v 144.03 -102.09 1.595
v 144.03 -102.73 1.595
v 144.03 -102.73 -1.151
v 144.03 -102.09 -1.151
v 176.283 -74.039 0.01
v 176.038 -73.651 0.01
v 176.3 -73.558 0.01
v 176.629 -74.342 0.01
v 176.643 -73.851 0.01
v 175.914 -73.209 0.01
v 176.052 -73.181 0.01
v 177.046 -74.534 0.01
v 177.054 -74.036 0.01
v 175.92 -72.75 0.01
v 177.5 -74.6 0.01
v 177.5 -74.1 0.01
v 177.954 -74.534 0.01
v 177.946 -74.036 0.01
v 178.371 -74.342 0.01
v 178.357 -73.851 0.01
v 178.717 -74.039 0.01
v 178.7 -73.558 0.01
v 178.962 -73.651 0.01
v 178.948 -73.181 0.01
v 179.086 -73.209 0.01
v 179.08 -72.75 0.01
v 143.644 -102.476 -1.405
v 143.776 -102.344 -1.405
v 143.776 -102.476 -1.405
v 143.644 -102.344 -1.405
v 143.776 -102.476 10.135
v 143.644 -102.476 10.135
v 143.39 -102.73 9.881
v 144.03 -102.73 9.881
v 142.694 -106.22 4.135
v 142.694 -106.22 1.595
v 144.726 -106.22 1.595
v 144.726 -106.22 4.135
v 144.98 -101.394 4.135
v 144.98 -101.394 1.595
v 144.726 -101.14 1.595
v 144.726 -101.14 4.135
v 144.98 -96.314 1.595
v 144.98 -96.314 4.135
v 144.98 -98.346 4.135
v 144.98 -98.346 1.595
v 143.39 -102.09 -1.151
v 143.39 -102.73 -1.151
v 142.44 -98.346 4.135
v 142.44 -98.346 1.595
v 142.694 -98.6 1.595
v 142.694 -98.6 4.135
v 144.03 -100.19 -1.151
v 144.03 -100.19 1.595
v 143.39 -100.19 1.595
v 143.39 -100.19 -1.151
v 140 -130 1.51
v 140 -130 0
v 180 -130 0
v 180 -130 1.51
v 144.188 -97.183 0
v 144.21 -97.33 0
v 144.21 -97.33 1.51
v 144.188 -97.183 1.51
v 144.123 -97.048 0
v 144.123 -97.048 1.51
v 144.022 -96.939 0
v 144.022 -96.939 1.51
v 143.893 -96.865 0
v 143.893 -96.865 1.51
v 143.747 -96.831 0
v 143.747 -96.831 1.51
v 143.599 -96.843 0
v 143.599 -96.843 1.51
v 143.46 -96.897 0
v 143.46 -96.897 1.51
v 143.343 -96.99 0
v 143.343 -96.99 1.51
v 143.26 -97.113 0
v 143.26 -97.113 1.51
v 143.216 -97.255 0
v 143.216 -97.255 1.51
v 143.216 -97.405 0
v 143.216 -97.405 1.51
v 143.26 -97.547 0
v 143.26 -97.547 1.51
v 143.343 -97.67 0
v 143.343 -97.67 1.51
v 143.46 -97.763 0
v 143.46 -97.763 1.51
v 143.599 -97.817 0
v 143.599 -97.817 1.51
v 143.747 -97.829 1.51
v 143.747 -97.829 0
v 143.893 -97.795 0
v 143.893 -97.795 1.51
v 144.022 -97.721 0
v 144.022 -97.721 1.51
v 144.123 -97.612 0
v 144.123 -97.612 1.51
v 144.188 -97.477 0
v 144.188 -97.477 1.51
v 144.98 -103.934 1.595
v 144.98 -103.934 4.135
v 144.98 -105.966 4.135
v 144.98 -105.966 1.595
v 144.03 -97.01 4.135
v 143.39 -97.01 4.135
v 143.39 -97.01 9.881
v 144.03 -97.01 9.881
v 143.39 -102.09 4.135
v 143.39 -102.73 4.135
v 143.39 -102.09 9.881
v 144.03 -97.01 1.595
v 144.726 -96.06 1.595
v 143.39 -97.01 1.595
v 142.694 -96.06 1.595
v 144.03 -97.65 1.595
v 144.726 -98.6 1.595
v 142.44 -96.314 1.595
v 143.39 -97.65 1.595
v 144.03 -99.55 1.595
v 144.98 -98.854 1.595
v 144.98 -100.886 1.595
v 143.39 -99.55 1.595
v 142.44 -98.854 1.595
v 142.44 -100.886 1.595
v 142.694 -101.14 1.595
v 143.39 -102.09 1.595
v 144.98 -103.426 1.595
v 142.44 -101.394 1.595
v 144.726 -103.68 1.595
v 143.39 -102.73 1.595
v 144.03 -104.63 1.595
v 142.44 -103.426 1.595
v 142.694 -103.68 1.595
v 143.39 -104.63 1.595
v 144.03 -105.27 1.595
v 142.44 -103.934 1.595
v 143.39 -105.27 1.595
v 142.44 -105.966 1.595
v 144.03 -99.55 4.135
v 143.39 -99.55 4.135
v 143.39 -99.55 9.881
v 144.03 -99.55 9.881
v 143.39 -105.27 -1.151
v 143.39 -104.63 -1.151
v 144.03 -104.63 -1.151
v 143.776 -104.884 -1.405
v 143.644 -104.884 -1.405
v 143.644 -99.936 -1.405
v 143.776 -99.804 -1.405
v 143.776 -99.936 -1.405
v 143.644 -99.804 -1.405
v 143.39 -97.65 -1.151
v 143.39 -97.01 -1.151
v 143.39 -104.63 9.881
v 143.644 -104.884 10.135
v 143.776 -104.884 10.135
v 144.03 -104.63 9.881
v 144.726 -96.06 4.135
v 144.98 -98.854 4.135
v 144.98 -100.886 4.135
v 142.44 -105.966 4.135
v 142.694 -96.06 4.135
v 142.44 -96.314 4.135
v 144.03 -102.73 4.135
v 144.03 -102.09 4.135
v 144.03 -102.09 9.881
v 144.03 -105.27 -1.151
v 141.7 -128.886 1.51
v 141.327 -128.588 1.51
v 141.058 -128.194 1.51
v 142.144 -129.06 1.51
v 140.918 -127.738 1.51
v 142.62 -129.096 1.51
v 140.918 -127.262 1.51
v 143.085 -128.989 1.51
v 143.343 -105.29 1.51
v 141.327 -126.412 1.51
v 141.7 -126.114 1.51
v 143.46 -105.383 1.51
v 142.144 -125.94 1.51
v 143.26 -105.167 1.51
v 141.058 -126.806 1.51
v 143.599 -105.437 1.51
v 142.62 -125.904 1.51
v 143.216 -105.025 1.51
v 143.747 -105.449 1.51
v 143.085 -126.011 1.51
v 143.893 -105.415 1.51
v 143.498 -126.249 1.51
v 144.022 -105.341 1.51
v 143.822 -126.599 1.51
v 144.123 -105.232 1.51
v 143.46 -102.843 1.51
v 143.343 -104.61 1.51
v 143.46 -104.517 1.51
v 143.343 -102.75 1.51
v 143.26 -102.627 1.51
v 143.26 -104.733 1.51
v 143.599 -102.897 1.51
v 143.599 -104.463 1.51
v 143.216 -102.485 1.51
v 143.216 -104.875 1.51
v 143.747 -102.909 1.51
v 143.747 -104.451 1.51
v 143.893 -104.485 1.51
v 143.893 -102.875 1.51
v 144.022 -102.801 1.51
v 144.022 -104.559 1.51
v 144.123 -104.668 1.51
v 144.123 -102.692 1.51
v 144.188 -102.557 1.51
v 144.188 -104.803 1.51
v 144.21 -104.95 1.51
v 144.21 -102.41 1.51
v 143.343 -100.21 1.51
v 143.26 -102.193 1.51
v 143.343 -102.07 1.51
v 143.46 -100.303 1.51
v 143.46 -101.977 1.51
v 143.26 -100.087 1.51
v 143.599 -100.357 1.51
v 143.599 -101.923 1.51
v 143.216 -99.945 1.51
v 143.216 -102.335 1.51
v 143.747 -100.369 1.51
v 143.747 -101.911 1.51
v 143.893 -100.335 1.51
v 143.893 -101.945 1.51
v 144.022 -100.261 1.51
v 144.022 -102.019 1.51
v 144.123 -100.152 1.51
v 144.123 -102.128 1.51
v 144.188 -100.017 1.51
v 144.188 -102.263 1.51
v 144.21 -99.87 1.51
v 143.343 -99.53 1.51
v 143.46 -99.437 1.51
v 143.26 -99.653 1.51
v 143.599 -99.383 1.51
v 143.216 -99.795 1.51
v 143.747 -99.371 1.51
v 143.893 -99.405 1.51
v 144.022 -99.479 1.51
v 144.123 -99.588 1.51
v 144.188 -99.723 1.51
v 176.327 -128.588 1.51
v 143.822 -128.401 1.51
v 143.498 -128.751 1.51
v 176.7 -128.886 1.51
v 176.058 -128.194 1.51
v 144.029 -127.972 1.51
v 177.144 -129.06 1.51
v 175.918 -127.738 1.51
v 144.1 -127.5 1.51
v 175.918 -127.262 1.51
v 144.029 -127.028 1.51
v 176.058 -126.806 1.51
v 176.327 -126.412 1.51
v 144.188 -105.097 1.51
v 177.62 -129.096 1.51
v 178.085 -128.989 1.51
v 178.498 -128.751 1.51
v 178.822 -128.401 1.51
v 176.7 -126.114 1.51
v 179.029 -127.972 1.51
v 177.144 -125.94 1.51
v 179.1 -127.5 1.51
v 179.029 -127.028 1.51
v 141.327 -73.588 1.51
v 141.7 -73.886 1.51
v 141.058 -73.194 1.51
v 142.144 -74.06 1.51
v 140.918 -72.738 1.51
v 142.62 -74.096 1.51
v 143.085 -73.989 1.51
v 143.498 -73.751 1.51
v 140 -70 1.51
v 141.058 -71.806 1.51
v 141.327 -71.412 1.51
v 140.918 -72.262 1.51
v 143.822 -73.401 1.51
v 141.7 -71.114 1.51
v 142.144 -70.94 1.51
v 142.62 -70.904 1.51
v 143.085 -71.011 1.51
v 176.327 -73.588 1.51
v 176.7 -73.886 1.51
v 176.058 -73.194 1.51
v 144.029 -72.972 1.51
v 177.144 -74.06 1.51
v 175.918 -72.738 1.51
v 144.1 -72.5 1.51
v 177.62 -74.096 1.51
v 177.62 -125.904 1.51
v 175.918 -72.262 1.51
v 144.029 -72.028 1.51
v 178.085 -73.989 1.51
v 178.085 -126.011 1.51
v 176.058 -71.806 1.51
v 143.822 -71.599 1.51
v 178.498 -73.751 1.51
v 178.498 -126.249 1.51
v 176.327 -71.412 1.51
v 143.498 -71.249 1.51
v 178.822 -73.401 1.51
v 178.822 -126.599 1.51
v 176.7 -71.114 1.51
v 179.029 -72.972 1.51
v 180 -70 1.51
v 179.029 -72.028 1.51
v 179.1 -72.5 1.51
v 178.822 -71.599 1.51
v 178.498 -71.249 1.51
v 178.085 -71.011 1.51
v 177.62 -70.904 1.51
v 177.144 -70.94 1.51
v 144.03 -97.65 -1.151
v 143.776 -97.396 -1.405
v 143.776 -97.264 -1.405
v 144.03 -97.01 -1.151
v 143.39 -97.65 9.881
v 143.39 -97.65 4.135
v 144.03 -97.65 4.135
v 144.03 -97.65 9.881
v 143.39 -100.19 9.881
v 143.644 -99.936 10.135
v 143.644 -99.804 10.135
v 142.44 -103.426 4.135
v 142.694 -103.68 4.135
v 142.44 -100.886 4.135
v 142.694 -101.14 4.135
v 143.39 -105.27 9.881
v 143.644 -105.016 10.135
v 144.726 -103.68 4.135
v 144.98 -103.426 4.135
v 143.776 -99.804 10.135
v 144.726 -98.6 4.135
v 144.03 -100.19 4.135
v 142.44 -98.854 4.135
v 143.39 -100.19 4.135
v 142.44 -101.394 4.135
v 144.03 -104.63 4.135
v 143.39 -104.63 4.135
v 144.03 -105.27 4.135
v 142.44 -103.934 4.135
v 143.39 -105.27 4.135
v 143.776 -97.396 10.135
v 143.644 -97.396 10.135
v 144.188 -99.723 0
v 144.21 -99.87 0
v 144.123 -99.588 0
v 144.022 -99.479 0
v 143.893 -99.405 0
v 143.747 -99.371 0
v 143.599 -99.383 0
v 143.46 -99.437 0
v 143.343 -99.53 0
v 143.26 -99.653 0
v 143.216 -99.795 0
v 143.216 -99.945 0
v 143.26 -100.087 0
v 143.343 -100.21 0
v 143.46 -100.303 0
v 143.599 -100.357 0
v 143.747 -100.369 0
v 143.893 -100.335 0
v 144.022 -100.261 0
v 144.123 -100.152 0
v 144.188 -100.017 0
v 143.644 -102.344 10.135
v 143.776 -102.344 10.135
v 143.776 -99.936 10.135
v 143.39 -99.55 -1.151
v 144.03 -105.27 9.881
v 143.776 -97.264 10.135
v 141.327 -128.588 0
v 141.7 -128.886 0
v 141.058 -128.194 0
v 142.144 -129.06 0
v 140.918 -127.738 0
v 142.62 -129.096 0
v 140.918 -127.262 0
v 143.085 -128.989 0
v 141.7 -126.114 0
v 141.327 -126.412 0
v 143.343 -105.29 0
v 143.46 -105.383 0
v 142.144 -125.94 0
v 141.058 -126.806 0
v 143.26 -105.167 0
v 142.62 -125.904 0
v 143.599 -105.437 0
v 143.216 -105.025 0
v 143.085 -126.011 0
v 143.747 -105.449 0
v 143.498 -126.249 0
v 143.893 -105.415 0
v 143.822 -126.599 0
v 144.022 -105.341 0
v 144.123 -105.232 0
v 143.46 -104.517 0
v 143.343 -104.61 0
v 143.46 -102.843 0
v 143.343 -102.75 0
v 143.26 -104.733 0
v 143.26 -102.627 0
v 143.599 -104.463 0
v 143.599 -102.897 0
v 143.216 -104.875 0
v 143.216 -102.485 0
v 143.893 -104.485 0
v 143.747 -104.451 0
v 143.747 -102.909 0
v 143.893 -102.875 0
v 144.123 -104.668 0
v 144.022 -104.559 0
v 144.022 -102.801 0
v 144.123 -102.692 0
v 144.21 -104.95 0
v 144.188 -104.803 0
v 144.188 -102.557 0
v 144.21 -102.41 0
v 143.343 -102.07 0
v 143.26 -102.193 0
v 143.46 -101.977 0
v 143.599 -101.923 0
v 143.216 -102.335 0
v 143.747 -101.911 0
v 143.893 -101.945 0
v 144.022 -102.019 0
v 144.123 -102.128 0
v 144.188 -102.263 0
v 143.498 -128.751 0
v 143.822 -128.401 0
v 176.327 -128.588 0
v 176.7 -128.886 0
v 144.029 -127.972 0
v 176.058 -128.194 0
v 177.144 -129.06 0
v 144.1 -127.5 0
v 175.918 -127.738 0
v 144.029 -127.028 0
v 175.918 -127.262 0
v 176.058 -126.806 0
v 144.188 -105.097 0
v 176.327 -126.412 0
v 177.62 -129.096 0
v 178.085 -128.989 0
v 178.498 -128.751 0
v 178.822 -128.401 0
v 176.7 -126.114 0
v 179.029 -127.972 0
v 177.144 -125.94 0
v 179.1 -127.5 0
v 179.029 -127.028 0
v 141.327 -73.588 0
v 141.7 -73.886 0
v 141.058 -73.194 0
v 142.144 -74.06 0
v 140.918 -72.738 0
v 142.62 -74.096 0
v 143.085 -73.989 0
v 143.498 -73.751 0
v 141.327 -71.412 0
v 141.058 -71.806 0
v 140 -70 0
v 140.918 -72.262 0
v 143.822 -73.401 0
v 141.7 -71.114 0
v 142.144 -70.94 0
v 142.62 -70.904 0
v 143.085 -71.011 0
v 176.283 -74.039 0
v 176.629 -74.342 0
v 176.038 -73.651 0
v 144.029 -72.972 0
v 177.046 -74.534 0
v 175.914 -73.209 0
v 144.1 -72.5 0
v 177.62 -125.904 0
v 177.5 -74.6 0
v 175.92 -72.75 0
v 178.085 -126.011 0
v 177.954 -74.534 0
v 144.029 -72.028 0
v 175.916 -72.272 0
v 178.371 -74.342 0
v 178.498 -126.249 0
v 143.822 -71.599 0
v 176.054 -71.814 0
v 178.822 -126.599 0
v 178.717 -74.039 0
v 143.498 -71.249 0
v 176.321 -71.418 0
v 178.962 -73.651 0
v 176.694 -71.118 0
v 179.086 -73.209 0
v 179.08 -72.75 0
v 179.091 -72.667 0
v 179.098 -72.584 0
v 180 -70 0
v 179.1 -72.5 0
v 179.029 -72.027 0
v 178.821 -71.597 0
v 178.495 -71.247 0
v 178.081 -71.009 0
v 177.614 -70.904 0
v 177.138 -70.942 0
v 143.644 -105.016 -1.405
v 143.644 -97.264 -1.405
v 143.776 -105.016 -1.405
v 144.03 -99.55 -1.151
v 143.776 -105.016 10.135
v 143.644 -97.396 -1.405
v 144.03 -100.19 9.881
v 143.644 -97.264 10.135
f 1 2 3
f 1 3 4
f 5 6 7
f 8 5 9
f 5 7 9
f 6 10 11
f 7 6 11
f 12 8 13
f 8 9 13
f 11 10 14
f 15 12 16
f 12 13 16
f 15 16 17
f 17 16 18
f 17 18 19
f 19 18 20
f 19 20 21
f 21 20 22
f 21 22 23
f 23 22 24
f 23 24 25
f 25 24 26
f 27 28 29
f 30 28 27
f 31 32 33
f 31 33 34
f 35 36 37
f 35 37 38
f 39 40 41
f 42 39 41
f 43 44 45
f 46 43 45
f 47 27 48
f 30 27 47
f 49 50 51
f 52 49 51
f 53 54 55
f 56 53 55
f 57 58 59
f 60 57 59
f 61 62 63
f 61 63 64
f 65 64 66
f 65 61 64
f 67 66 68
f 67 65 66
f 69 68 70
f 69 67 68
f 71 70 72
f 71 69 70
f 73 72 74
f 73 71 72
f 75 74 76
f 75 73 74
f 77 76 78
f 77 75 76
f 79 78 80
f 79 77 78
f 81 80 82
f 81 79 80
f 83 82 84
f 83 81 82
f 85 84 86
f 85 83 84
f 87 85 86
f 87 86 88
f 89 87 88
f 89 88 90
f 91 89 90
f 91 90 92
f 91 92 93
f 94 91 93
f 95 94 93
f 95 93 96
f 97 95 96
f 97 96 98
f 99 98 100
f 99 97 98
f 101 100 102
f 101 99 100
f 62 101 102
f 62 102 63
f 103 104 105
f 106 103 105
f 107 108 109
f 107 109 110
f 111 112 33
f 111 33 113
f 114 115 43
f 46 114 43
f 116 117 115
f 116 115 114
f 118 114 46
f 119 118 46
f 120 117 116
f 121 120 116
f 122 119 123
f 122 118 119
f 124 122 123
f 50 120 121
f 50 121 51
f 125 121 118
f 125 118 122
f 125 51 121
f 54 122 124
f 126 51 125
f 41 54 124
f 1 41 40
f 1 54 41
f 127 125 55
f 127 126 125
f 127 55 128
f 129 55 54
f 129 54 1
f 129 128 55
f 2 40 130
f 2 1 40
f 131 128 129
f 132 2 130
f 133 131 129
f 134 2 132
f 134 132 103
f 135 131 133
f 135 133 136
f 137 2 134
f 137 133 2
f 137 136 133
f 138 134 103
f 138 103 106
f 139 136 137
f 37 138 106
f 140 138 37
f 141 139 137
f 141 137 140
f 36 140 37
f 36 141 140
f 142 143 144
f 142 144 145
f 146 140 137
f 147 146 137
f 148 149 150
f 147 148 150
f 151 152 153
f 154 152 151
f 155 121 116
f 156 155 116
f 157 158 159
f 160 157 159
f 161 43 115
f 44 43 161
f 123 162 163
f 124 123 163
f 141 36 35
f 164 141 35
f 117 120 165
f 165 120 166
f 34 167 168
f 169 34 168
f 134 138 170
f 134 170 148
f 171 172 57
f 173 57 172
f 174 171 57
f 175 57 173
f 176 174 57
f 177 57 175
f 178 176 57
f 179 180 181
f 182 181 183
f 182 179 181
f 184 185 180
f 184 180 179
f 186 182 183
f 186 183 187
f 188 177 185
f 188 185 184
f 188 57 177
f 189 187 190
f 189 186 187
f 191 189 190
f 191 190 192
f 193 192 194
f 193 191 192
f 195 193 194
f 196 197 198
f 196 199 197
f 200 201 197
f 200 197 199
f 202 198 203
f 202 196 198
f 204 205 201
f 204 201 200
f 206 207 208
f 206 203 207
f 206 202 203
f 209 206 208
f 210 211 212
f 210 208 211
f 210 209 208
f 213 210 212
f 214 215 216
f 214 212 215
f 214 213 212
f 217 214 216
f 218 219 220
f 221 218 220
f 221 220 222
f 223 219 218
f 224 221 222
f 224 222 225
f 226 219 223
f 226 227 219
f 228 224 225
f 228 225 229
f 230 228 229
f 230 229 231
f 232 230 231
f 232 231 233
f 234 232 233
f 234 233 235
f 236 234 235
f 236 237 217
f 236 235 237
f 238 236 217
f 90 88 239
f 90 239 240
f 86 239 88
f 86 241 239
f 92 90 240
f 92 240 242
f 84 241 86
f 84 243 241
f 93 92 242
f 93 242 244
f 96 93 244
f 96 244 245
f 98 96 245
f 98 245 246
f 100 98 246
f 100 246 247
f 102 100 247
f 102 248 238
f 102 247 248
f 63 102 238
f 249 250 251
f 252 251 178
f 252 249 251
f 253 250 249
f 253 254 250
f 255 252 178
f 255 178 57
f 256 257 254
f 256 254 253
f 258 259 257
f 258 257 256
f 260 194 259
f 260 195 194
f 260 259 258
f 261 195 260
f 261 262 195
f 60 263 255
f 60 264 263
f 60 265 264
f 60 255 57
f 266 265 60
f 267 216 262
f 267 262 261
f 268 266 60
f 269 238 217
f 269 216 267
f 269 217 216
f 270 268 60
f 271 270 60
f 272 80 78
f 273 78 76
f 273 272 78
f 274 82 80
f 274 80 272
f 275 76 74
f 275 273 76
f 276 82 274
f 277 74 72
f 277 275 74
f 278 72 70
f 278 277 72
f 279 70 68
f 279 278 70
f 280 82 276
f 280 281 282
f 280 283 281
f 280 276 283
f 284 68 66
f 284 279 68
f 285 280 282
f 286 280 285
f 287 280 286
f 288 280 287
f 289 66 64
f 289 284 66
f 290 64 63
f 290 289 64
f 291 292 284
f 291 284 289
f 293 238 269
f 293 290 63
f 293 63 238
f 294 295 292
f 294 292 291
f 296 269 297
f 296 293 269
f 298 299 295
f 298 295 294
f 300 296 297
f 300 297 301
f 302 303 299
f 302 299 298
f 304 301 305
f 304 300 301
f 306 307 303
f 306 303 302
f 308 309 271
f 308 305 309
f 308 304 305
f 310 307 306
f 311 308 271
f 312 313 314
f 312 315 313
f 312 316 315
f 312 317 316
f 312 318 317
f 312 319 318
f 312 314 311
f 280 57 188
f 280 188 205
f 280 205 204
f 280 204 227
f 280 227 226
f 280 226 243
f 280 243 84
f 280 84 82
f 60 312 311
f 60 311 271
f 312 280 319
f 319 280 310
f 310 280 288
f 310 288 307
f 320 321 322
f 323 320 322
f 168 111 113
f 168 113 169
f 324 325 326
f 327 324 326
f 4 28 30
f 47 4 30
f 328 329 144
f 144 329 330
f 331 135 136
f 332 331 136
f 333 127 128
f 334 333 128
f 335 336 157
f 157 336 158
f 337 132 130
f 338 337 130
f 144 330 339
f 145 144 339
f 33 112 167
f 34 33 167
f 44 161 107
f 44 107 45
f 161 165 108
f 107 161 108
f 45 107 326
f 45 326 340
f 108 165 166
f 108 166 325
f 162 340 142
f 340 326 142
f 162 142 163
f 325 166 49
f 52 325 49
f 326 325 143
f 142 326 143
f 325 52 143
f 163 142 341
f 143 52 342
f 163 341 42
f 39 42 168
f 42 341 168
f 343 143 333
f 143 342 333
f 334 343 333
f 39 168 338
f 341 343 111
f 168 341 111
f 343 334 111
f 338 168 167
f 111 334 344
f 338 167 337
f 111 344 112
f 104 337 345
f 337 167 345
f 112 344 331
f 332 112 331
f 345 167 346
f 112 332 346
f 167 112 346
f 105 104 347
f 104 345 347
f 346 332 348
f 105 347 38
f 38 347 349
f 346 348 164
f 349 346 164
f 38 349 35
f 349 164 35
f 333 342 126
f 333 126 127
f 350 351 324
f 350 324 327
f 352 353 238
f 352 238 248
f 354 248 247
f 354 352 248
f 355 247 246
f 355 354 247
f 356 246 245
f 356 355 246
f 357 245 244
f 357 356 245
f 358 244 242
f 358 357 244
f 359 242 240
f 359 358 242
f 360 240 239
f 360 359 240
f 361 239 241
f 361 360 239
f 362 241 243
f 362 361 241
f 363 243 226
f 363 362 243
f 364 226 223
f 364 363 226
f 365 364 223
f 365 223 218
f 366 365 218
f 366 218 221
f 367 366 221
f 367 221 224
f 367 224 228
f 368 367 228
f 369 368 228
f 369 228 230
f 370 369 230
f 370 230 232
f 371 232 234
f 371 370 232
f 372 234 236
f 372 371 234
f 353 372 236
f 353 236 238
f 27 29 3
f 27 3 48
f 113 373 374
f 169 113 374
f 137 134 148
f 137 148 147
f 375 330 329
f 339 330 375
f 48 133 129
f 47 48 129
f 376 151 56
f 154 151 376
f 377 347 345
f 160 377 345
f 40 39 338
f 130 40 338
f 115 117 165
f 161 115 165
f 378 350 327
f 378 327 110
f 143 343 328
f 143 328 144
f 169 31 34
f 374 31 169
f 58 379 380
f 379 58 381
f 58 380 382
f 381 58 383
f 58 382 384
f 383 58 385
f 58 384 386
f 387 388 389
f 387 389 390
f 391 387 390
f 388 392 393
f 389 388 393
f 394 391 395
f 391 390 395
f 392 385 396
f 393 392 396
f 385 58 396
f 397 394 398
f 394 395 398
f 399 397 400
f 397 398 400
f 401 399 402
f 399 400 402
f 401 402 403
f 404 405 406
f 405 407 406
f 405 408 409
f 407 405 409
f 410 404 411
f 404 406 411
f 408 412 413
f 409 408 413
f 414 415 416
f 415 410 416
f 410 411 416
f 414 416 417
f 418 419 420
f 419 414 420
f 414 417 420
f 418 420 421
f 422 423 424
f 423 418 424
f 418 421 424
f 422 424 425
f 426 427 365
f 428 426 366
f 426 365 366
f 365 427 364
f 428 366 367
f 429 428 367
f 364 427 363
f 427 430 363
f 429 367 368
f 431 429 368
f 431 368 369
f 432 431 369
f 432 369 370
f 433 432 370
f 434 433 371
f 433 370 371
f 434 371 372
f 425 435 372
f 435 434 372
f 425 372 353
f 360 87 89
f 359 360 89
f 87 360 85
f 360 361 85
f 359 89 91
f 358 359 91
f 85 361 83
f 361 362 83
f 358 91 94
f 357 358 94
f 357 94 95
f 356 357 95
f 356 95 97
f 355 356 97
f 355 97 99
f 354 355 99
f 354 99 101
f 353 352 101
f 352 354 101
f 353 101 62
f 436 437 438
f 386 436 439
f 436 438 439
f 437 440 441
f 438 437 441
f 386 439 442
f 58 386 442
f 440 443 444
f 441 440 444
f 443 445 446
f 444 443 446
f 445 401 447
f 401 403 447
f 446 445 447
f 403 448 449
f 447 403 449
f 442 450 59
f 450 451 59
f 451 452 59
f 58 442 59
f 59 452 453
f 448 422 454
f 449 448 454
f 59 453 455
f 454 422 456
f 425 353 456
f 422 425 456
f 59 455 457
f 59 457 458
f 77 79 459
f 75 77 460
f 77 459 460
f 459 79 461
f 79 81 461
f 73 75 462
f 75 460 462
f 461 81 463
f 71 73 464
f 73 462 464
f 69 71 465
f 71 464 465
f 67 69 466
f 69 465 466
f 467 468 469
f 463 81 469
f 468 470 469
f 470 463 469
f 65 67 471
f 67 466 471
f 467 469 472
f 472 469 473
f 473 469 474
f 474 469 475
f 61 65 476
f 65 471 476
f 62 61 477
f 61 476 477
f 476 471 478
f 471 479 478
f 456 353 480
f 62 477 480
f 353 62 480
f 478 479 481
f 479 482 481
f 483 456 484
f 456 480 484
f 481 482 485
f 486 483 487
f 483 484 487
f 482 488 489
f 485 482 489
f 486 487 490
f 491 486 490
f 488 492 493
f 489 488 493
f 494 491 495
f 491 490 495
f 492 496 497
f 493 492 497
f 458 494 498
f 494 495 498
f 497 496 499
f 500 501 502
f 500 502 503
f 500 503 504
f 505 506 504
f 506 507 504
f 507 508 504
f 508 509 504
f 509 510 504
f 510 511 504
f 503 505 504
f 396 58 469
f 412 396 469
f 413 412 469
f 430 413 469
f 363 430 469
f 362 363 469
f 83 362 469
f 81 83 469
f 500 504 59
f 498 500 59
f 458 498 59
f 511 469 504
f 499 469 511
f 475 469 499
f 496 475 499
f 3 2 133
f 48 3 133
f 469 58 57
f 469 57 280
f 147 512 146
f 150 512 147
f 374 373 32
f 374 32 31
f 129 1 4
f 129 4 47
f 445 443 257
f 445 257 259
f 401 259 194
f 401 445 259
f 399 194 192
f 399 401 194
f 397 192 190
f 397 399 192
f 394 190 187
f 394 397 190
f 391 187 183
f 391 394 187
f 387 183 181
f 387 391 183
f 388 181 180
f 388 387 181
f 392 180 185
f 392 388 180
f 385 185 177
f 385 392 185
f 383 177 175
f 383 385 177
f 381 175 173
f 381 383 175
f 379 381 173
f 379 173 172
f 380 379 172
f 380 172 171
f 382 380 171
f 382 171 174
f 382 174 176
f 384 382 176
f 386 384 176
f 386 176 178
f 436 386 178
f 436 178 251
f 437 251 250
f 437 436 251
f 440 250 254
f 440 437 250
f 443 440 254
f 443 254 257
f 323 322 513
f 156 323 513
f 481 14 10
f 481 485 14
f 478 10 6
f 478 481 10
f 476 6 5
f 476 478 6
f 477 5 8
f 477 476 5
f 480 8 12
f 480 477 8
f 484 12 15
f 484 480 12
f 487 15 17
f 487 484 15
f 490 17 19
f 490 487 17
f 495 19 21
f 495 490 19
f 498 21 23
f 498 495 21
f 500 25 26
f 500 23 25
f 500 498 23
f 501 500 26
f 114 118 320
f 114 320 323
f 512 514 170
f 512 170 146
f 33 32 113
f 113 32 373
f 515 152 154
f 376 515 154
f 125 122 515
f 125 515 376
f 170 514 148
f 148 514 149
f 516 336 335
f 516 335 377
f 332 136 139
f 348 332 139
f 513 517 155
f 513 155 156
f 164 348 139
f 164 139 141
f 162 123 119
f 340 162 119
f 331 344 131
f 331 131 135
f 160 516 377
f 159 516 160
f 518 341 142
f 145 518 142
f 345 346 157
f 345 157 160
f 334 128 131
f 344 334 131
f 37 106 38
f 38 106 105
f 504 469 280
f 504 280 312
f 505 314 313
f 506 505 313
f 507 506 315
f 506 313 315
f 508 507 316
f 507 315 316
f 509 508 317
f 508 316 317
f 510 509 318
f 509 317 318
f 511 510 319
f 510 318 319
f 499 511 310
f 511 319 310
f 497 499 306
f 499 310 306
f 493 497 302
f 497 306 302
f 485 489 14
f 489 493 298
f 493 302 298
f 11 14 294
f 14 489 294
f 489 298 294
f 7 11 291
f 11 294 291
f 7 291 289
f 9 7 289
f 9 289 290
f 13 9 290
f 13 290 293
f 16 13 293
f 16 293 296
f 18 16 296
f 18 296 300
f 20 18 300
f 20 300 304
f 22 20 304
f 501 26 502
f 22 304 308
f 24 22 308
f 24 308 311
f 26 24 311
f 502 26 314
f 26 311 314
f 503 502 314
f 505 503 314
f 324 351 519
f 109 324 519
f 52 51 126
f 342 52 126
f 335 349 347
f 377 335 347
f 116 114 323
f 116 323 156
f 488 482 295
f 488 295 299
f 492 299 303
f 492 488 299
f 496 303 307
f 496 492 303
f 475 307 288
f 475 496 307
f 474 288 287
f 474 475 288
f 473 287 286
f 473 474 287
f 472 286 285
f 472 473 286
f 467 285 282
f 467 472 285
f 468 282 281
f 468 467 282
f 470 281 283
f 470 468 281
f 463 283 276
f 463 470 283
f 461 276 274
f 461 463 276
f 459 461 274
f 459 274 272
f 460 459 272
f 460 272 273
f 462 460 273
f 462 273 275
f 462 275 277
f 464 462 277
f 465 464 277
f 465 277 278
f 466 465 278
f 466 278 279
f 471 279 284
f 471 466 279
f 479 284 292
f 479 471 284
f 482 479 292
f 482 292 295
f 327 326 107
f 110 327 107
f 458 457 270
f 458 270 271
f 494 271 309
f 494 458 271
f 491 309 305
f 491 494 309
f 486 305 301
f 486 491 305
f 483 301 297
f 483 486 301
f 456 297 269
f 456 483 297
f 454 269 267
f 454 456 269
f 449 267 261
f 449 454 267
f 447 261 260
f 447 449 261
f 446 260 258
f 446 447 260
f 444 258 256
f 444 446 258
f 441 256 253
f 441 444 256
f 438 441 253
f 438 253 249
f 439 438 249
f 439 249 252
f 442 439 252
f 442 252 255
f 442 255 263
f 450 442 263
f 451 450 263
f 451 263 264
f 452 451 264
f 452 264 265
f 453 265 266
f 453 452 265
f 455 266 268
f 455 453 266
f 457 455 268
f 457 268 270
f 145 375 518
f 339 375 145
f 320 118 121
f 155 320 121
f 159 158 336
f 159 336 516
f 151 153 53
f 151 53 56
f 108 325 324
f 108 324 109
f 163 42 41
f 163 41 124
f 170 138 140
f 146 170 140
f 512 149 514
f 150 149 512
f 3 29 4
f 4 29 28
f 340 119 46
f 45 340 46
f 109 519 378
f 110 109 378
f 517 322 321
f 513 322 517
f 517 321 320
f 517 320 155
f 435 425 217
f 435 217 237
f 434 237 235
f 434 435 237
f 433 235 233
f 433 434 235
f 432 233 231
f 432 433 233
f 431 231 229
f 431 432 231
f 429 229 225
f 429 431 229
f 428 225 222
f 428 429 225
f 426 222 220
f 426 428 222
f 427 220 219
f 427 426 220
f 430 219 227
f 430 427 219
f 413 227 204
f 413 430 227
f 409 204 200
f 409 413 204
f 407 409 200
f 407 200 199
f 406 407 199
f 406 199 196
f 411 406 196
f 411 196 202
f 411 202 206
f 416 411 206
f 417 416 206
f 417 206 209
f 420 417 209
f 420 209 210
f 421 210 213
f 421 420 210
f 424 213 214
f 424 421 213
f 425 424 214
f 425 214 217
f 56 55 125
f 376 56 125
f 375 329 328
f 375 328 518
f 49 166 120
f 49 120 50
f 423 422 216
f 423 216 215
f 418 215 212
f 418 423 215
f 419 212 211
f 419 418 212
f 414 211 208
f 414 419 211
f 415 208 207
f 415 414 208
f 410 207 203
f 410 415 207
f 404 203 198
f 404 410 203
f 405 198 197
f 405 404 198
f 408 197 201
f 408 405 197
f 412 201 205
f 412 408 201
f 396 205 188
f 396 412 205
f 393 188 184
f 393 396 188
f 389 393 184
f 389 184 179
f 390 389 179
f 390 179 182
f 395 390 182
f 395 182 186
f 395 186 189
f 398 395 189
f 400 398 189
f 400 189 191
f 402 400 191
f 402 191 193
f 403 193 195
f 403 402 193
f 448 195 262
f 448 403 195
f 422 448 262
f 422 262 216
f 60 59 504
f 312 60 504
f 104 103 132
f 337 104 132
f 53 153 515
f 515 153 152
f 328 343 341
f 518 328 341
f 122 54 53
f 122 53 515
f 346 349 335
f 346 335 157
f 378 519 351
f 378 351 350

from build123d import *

# Parameters (mm, degrees)
SKETCH1_W                  = 10.16
SKETCH1_H                  = 2.54
BOSS_EXTRUDE1_DEPTH        = 2.54
CUT_EXTRUDE1_DEPTH         = 180.745209672
CUT_EXTRUDE2_DEPTH         = 180.745209672
CUT_EXTRUDE3_DEPTH         = 180.745209672
CUT_EXTRUDE4_DEPTH         = 180.745209672
CUT_EXTRUDE5_DEPTH         = 180.745209672
CUT_EXTRUDE6_DEPTH         = 180.745209672
SKETCH8_W                  = 0.64
SKETCH8_H                  = 0.64
BOSS_EXTRUDE2_DEPTH        = 6
SKETCH9_W                  = 0.64
SKETCH9_H                  = 0.64
BOSS_EXTRUDE3_DEPTH        = 6
SKETCH10_W                 = 0.64
SKETCH10_H                 = 0.64
BOSS_EXTRUDE4_DEPTH        = 6
SKETCH11_W                 = 0.64
SKETCH11_H                 = 0.64
BOSS_EXTRUDE5_DEPTH        = 6
SKETCH12_W                 = 0.64
SKETCH12_H                 = 0.64
BOSS_EXTRUDE6_DEPTH        = 3
SKETCH13_W                 = 0.64
SKETCH13_H                 = 0.64
BOSS_EXTRUDE7_DEPTH        = 3
SKETCH14_W                 = 0.64
SKETCH14_H                 = 0.64
BOSS_EXTRUDE8_DEPTH        = 3
SKETCH15_W                 = 0.64
SKETCH15_H                 = 0.64
BOSS_EXTRUDE9_DEPTH        = 3
DRAFT1_ANGLE               = 45
DRAFT2_ANGLE               = 45
DRAFT3_ANGLE               = 45
DRAFT4_ANGLE               = 45
CHAMFER1_SIZE              = 0.254
BOSS_EXTRUDE10_START       = -1.51
BOSS_EXTRUDE10_OUTLINE_W   = 40
BOSS_EXTRUDE10_OUTLINE_H   = 60
BOSS_EXTRUDE10_OUTLINE_R   = 1.6
BOSS_EXTRUDE10_OUTLINE_R_2 = 0.5
BOSS_EXTRUDE10_DEPTH       = 1.51
BOSS_EXTRUDE10_START_2     = -1.5
BOSS_EXTRUDE10_2_OUTLINE_R = 1.6
BOSS_EXTRUDE10_2_DEPTH     = 1.5
SKETCH18_R                 = 1.6
CUT_EXTRUDE8_DEPTH         = 223.203489228


# Read off the part's stored shape, not the designer's step: Boss-Extrude10
with BuildPart() as part:
    # Sketch1 → Boss-Extrude1 (new body)
    with BuildSketch(Plane(origin=(142.44, 0, 0), x_dir=(0, -1, 0), z_dir=(-1, 0, 0))):
        with Locations((101.14, 2.865)):
            Rectangle(SKETCH1_W, SKETCH1_H)
    extrude(amount=-BOSS_EXTRUDE1_DEPTH)

    # Sketch2 → Cut-Extrude1 (cut, through all)
    with BuildSketch(Plane(origin=(0, 0, 1.595), x_dir=(-1, 0, 0), z_dir=(0, 0, -1))):
        Polygon((-144.98, -103.426), (-144.98, -103.934), (-144.472, -103.934), align=None)
    extrude(amount=-CUT_EXTRUDE1_DEPTH, mode=Mode.SUBTRACT)

    # Sketch3 → Cut-Extrude2 (cut, through all)
    with BuildSketch(Plane(origin=(0, 0, 1.595), x_dir=(-1, 0, 0), z_dir=(0, 0, -1))):
        Polygon((-144.98, -100.886), (-144.98, -101.394), (-144.472, -100.886), align=None)
    extrude(amount=-CUT_EXTRUDE2_DEPTH, mode=Mode.SUBTRACT)

    # Sketch4 → Cut-Extrude3 (cut, through all)
    with BuildSketch(Plane(origin=(0, 0, 1.595), x_dir=(-1, 0, 0), z_dir=(0, 0, -1))):
        Polygon((-144.98, -98.346), (-144.98, -98.854), (-144.472, -98.854), align=None)
    extrude(amount=-CUT_EXTRUDE3_DEPTH, mode=Mode.SUBTRACT)

    # Sketch5 → Cut-Extrude4 (cut, through all)
    with BuildSketch(Plane(origin=(0, 0, 1.595), x_dir=(-1, 0, 0), z_dir=(0, 0, -1))):
        Polygon((-142.44, -98.854), (-142.44, -98.346), (-142.948, -98.854), align=None)
    extrude(amount=-CUT_EXTRUDE4_DEPTH, mode=Mode.SUBTRACT)

    # Sketch6 → Cut-Extrude5 (cut, through all)
    with BuildSketch(Plane(origin=(0, 0, 1.595), x_dir=(-1, 0, 0), z_dir=(0, 0, -1))):
        Polygon((-142.44, -101.394), (-142.44, -100.886), (-142.948, -100.886), align=None)
    extrude(amount=-CUT_EXTRUDE5_DEPTH, mode=Mode.SUBTRACT)

    # Sketch7 → Cut-Extrude6 (cut, through all)
    with BuildSketch(Plane(origin=(0, 0, 1.595), x_dir=(-1, 0, 0), z_dir=(0, 0, -1))):
        Polygon((-142.44, -103.934), (-142.44, -103.426), (-142.948, -103.934), align=None)
    extrude(amount=-CUT_EXTRUDE6_DEPTH, mode=Mode.SUBTRACT)

    # Sketch8 → Boss-Extrude2 (add)
    with BuildSketch(Plane.XY.offset(4.135)):
        with Locations((143.71, -102.41)):
            Rectangle(SKETCH8_W, SKETCH8_H)
    extrude(amount=BOSS_EXTRUDE2_DEPTH)

    # Sketch9 → Boss-Extrude3 (add)
    with BuildSketch(Plane.XY.offset(4.135)):
        with Locations((143.71, -104.95)):
            Rectangle(SKETCH9_W, SKETCH9_H)
    extrude(amount=BOSS_EXTRUDE3_DEPTH)

    # Sketch10 → Boss-Extrude4 (add)
    with BuildSketch(Plane.XY.offset(4.135)):
        with Locations((143.71, -97.33)):
            Rectangle(SKETCH10_W, SKETCH10_H)
    extrude(amount=BOSS_EXTRUDE4_DEPTH)

    # Sketch11 → Boss-Extrude5 (add)
    with BuildSketch(Plane.XY.offset(4.135)):
        with Locations((143.71, -99.87)):
            Rectangle(SKETCH11_W, SKETCH11_H)
    extrude(amount=BOSS_EXTRUDE5_DEPTH)

    # Sketch12 → Boss-Extrude6 (add)
    with BuildSketch(Plane(origin=(0, 0, 1.595), x_dir=(-1, 0, 0), z_dir=(0, 0, -1))):
        with Locations((-143.71, -102.41)):
            Rectangle(SKETCH12_W, SKETCH12_H)
    extrude(amount=BOSS_EXTRUDE6_DEPTH)

    # Sketch13 → Boss-Extrude7 (add)
    with BuildSketch(Plane(origin=(0, 0, 1.595), x_dir=(-1, 0, 0), z_dir=(0, 0, -1))):
        with Locations((-143.71, -104.95)):
            Rectangle(SKETCH13_W, SKETCH13_H)
    extrude(amount=BOSS_EXTRUDE7_DEPTH)

    # Sketch14 → Boss-Extrude8 (add)
    with BuildSketch(Plane(origin=(0, 0, 1.595), x_dir=(-1, 0, 0), z_dir=(0, 0, -1))):
        with Locations((-143.71, -97.33)):
            Rectangle(SKETCH14_W, SKETCH14_H)
    extrude(amount=BOSS_EXTRUDE8_DEPTH)

    # Sketch15 → Boss-Extrude9 (add)
    with BuildSketch(Plane(origin=(0, 0, 1.595), x_dir=(-1, 0, 0), z_dir=(0, 0, -1))):
        with Locations((-143.71, -99.87)):
            Rectangle(SKETCH15_W, SKETCH15_H)
    extrude(amount=BOSS_EXTRUDE9_DEPTH)

    # Draft1
    draft1_faces = [part.faces().sort_by_distance(p)[0] for p in [
        (144.726, -103.934, 2.865),
    ]]
    draft(draft1_faces, Plane(origin=(144.98, 0, 0), x_dir=(0, 0, 1), z_dir=(1, 0, 0)), DRAFT1_ANGLE)

    # Draft2
    draft2_faces = [part.faces().sort_by_distance(p)[0] for p in [
        (142.694, -103.934, 2.865),
    ]]
    draft(draft2_faces, Plane(origin=(142.44, 0, 0), x_dir=(0, 0, -1), z_dir=(-1, 0, 0)), DRAFT2_ANGLE)

    # Draft3
    draft3_faces = [part.faces().sort_by_distance(p)[0] for p in [
        (144.726, -100.886, 2.865),
        (144.726, -98.854, 2.865),
    ]]
    draft(draft3_faces, Plane(origin=(144.98, 0, 0), x_dir=(0, 0, 1), z_dir=(1, 0, 0)), DRAFT3_ANGLE)

    # Draft4
    draft4_faces = [part.faces().sort_by_distance(p)[0] for p in [
        (142.694, -98.854, 2.865),
        (142.694, -100.886, 2.865),
    ]]
    draft(draft4_faces, Plane(origin=(142.44, 0, 0), x_dir=(0, 0, -1), z_dir=(-1, 0, 0)), DRAFT4_ANGLE)

    # Chamfer1
    chamfer1_edges = [part.edges().sort_by_distance(p)[0] for p in [
        (143.71, -102.09, 10.135),
        (143.39, -102.41, 10.135),
        (143.71, -102.73, 10.135),
        (144.03, -102.41, 10.135),
        (143.71, -104.63, 10.135),
        (143.39, -104.95, 10.135),
        (143.71, -105.27, 10.135),
        (144.03, -104.95, 10.135),
        (144.98, -106.22, 2.865),
        (143.71, -97.01, 10.135),
        (143.39, -97.33, 10.135),
        (143.71, -97.65, 10.135),
        (144.03, -97.33, 10.135),
        (143.39, -99.87, 10.135),
        (143.71, -100.19, 10.135),
        (144.03, -99.87, 10.135),
        (143.71, -99.55, 10.135),
        (143.71, -102.73, -1.405),
        (143.39, -102.41, -1.405),
        (143.71, -102.09, -1.405),
        (144.03, -102.41, -1.405),
        (143.39, -104.95, -1.405),
        (143.71, -104.63, -1.405),
        (144.03, -104.95, -1.405),
        (143.71, -105.27, -1.405),
        (143.39, -97.33, -1.405),
        (143.71, -97.01, -1.405),
        (144.03, -97.33, -1.405),
        (143.71, -97.65, -1.405),
        (143.71, -100.19, -1.405),
        (143.39, -99.87, -1.405),
        (143.71, -99.55, -1.405),
        (144.03, -99.87, -1.405),
        (144.98, -96.06, 2.865),
        (142.44, -106.22, 2.865),
        (142.44, -96.06, 2.865),
    ]]
    chamfer(chamfer1_edges, length=CHAMFER1_SIZE)


with BuildPart() as body_2:
    # Boss-Extrude10 outline → Boss-Extrude10 (new body)
    with BuildSketch(Plane.XY.offset(1.51).offset(BOSS_EXTRUDE10_START)):
        with Locations((160, -100)):
            Rectangle(BOSS_EXTRUDE10_OUTLINE_W, BOSS_EXTRUDE10_OUTLINE_H)
        with Locations((142.5, -127.5)):
            Circle(BOSS_EXTRUDE10_OUTLINE_R, mode=Mode.SUBTRACT)
        with Locations((143.71, -104.95)):
            Circle(BOSS_EXTRUDE10_OUTLINE_R_2, mode=Mode.SUBTRACT)
        with Locations((143.71, -102.41)):
            Circle(BOSS_EXTRUDE10_OUTLINE_R_2, mode=Mode.SUBTRACT)
        with Locations((177.5, -127.5)):
            Circle(BOSS_EXTRUDE10_OUTLINE_R, mode=Mode.SUBTRACT)
        with Locations((143.71, -99.87)):
            Circle(BOSS_EXTRUDE10_OUTLINE_R_2, mode=Mode.SUBTRACT)
        with Locations((143.71, -97.33)):
            Circle(BOSS_EXTRUDE10_OUTLINE_R_2, mode=Mode.SUBTRACT)
        with Locations((142.5, -72.5)):
            Circle(BOSS_EXTRUDE10_OUTLINE_R, mode=Mode.SUBTRACT)
        with Locations((177.5, -73)):
            Circle(BOSS_EXTRUDE10_OUTLINE_R, mode=Mode.SUBTRACT)
    extrude(amount=BOSS_EXTRUDE10_DEPTH)

    # Boss-Extrude10 2 outline → Boss-Extrude10 2 (add)
    with BuildSketch(Plane.XY.offset(1.51).offset(BOSS_EXTRUDE10_START_2)):
        with Locations((177.5, -73)):
            Circle(BOSS_EXTRUDE10_2_OUTLINE_R)
    extrude(amount=BOSS_EXTRUDE10_2_DEPTH)

    # Sketch18 → Cut-Extrude8 (cut, through all)
    with BuildSketch(Plane.XY.offset(1.51)):
        with Locations((177.5, -72.5)):
            Circle(SKETCH18_R)
    extrude(amount=-CUT_EXTRUDE8_DEPTH, mode=Mode.SUBTRACT)


solid = Compound([part.part, body_2.part])
